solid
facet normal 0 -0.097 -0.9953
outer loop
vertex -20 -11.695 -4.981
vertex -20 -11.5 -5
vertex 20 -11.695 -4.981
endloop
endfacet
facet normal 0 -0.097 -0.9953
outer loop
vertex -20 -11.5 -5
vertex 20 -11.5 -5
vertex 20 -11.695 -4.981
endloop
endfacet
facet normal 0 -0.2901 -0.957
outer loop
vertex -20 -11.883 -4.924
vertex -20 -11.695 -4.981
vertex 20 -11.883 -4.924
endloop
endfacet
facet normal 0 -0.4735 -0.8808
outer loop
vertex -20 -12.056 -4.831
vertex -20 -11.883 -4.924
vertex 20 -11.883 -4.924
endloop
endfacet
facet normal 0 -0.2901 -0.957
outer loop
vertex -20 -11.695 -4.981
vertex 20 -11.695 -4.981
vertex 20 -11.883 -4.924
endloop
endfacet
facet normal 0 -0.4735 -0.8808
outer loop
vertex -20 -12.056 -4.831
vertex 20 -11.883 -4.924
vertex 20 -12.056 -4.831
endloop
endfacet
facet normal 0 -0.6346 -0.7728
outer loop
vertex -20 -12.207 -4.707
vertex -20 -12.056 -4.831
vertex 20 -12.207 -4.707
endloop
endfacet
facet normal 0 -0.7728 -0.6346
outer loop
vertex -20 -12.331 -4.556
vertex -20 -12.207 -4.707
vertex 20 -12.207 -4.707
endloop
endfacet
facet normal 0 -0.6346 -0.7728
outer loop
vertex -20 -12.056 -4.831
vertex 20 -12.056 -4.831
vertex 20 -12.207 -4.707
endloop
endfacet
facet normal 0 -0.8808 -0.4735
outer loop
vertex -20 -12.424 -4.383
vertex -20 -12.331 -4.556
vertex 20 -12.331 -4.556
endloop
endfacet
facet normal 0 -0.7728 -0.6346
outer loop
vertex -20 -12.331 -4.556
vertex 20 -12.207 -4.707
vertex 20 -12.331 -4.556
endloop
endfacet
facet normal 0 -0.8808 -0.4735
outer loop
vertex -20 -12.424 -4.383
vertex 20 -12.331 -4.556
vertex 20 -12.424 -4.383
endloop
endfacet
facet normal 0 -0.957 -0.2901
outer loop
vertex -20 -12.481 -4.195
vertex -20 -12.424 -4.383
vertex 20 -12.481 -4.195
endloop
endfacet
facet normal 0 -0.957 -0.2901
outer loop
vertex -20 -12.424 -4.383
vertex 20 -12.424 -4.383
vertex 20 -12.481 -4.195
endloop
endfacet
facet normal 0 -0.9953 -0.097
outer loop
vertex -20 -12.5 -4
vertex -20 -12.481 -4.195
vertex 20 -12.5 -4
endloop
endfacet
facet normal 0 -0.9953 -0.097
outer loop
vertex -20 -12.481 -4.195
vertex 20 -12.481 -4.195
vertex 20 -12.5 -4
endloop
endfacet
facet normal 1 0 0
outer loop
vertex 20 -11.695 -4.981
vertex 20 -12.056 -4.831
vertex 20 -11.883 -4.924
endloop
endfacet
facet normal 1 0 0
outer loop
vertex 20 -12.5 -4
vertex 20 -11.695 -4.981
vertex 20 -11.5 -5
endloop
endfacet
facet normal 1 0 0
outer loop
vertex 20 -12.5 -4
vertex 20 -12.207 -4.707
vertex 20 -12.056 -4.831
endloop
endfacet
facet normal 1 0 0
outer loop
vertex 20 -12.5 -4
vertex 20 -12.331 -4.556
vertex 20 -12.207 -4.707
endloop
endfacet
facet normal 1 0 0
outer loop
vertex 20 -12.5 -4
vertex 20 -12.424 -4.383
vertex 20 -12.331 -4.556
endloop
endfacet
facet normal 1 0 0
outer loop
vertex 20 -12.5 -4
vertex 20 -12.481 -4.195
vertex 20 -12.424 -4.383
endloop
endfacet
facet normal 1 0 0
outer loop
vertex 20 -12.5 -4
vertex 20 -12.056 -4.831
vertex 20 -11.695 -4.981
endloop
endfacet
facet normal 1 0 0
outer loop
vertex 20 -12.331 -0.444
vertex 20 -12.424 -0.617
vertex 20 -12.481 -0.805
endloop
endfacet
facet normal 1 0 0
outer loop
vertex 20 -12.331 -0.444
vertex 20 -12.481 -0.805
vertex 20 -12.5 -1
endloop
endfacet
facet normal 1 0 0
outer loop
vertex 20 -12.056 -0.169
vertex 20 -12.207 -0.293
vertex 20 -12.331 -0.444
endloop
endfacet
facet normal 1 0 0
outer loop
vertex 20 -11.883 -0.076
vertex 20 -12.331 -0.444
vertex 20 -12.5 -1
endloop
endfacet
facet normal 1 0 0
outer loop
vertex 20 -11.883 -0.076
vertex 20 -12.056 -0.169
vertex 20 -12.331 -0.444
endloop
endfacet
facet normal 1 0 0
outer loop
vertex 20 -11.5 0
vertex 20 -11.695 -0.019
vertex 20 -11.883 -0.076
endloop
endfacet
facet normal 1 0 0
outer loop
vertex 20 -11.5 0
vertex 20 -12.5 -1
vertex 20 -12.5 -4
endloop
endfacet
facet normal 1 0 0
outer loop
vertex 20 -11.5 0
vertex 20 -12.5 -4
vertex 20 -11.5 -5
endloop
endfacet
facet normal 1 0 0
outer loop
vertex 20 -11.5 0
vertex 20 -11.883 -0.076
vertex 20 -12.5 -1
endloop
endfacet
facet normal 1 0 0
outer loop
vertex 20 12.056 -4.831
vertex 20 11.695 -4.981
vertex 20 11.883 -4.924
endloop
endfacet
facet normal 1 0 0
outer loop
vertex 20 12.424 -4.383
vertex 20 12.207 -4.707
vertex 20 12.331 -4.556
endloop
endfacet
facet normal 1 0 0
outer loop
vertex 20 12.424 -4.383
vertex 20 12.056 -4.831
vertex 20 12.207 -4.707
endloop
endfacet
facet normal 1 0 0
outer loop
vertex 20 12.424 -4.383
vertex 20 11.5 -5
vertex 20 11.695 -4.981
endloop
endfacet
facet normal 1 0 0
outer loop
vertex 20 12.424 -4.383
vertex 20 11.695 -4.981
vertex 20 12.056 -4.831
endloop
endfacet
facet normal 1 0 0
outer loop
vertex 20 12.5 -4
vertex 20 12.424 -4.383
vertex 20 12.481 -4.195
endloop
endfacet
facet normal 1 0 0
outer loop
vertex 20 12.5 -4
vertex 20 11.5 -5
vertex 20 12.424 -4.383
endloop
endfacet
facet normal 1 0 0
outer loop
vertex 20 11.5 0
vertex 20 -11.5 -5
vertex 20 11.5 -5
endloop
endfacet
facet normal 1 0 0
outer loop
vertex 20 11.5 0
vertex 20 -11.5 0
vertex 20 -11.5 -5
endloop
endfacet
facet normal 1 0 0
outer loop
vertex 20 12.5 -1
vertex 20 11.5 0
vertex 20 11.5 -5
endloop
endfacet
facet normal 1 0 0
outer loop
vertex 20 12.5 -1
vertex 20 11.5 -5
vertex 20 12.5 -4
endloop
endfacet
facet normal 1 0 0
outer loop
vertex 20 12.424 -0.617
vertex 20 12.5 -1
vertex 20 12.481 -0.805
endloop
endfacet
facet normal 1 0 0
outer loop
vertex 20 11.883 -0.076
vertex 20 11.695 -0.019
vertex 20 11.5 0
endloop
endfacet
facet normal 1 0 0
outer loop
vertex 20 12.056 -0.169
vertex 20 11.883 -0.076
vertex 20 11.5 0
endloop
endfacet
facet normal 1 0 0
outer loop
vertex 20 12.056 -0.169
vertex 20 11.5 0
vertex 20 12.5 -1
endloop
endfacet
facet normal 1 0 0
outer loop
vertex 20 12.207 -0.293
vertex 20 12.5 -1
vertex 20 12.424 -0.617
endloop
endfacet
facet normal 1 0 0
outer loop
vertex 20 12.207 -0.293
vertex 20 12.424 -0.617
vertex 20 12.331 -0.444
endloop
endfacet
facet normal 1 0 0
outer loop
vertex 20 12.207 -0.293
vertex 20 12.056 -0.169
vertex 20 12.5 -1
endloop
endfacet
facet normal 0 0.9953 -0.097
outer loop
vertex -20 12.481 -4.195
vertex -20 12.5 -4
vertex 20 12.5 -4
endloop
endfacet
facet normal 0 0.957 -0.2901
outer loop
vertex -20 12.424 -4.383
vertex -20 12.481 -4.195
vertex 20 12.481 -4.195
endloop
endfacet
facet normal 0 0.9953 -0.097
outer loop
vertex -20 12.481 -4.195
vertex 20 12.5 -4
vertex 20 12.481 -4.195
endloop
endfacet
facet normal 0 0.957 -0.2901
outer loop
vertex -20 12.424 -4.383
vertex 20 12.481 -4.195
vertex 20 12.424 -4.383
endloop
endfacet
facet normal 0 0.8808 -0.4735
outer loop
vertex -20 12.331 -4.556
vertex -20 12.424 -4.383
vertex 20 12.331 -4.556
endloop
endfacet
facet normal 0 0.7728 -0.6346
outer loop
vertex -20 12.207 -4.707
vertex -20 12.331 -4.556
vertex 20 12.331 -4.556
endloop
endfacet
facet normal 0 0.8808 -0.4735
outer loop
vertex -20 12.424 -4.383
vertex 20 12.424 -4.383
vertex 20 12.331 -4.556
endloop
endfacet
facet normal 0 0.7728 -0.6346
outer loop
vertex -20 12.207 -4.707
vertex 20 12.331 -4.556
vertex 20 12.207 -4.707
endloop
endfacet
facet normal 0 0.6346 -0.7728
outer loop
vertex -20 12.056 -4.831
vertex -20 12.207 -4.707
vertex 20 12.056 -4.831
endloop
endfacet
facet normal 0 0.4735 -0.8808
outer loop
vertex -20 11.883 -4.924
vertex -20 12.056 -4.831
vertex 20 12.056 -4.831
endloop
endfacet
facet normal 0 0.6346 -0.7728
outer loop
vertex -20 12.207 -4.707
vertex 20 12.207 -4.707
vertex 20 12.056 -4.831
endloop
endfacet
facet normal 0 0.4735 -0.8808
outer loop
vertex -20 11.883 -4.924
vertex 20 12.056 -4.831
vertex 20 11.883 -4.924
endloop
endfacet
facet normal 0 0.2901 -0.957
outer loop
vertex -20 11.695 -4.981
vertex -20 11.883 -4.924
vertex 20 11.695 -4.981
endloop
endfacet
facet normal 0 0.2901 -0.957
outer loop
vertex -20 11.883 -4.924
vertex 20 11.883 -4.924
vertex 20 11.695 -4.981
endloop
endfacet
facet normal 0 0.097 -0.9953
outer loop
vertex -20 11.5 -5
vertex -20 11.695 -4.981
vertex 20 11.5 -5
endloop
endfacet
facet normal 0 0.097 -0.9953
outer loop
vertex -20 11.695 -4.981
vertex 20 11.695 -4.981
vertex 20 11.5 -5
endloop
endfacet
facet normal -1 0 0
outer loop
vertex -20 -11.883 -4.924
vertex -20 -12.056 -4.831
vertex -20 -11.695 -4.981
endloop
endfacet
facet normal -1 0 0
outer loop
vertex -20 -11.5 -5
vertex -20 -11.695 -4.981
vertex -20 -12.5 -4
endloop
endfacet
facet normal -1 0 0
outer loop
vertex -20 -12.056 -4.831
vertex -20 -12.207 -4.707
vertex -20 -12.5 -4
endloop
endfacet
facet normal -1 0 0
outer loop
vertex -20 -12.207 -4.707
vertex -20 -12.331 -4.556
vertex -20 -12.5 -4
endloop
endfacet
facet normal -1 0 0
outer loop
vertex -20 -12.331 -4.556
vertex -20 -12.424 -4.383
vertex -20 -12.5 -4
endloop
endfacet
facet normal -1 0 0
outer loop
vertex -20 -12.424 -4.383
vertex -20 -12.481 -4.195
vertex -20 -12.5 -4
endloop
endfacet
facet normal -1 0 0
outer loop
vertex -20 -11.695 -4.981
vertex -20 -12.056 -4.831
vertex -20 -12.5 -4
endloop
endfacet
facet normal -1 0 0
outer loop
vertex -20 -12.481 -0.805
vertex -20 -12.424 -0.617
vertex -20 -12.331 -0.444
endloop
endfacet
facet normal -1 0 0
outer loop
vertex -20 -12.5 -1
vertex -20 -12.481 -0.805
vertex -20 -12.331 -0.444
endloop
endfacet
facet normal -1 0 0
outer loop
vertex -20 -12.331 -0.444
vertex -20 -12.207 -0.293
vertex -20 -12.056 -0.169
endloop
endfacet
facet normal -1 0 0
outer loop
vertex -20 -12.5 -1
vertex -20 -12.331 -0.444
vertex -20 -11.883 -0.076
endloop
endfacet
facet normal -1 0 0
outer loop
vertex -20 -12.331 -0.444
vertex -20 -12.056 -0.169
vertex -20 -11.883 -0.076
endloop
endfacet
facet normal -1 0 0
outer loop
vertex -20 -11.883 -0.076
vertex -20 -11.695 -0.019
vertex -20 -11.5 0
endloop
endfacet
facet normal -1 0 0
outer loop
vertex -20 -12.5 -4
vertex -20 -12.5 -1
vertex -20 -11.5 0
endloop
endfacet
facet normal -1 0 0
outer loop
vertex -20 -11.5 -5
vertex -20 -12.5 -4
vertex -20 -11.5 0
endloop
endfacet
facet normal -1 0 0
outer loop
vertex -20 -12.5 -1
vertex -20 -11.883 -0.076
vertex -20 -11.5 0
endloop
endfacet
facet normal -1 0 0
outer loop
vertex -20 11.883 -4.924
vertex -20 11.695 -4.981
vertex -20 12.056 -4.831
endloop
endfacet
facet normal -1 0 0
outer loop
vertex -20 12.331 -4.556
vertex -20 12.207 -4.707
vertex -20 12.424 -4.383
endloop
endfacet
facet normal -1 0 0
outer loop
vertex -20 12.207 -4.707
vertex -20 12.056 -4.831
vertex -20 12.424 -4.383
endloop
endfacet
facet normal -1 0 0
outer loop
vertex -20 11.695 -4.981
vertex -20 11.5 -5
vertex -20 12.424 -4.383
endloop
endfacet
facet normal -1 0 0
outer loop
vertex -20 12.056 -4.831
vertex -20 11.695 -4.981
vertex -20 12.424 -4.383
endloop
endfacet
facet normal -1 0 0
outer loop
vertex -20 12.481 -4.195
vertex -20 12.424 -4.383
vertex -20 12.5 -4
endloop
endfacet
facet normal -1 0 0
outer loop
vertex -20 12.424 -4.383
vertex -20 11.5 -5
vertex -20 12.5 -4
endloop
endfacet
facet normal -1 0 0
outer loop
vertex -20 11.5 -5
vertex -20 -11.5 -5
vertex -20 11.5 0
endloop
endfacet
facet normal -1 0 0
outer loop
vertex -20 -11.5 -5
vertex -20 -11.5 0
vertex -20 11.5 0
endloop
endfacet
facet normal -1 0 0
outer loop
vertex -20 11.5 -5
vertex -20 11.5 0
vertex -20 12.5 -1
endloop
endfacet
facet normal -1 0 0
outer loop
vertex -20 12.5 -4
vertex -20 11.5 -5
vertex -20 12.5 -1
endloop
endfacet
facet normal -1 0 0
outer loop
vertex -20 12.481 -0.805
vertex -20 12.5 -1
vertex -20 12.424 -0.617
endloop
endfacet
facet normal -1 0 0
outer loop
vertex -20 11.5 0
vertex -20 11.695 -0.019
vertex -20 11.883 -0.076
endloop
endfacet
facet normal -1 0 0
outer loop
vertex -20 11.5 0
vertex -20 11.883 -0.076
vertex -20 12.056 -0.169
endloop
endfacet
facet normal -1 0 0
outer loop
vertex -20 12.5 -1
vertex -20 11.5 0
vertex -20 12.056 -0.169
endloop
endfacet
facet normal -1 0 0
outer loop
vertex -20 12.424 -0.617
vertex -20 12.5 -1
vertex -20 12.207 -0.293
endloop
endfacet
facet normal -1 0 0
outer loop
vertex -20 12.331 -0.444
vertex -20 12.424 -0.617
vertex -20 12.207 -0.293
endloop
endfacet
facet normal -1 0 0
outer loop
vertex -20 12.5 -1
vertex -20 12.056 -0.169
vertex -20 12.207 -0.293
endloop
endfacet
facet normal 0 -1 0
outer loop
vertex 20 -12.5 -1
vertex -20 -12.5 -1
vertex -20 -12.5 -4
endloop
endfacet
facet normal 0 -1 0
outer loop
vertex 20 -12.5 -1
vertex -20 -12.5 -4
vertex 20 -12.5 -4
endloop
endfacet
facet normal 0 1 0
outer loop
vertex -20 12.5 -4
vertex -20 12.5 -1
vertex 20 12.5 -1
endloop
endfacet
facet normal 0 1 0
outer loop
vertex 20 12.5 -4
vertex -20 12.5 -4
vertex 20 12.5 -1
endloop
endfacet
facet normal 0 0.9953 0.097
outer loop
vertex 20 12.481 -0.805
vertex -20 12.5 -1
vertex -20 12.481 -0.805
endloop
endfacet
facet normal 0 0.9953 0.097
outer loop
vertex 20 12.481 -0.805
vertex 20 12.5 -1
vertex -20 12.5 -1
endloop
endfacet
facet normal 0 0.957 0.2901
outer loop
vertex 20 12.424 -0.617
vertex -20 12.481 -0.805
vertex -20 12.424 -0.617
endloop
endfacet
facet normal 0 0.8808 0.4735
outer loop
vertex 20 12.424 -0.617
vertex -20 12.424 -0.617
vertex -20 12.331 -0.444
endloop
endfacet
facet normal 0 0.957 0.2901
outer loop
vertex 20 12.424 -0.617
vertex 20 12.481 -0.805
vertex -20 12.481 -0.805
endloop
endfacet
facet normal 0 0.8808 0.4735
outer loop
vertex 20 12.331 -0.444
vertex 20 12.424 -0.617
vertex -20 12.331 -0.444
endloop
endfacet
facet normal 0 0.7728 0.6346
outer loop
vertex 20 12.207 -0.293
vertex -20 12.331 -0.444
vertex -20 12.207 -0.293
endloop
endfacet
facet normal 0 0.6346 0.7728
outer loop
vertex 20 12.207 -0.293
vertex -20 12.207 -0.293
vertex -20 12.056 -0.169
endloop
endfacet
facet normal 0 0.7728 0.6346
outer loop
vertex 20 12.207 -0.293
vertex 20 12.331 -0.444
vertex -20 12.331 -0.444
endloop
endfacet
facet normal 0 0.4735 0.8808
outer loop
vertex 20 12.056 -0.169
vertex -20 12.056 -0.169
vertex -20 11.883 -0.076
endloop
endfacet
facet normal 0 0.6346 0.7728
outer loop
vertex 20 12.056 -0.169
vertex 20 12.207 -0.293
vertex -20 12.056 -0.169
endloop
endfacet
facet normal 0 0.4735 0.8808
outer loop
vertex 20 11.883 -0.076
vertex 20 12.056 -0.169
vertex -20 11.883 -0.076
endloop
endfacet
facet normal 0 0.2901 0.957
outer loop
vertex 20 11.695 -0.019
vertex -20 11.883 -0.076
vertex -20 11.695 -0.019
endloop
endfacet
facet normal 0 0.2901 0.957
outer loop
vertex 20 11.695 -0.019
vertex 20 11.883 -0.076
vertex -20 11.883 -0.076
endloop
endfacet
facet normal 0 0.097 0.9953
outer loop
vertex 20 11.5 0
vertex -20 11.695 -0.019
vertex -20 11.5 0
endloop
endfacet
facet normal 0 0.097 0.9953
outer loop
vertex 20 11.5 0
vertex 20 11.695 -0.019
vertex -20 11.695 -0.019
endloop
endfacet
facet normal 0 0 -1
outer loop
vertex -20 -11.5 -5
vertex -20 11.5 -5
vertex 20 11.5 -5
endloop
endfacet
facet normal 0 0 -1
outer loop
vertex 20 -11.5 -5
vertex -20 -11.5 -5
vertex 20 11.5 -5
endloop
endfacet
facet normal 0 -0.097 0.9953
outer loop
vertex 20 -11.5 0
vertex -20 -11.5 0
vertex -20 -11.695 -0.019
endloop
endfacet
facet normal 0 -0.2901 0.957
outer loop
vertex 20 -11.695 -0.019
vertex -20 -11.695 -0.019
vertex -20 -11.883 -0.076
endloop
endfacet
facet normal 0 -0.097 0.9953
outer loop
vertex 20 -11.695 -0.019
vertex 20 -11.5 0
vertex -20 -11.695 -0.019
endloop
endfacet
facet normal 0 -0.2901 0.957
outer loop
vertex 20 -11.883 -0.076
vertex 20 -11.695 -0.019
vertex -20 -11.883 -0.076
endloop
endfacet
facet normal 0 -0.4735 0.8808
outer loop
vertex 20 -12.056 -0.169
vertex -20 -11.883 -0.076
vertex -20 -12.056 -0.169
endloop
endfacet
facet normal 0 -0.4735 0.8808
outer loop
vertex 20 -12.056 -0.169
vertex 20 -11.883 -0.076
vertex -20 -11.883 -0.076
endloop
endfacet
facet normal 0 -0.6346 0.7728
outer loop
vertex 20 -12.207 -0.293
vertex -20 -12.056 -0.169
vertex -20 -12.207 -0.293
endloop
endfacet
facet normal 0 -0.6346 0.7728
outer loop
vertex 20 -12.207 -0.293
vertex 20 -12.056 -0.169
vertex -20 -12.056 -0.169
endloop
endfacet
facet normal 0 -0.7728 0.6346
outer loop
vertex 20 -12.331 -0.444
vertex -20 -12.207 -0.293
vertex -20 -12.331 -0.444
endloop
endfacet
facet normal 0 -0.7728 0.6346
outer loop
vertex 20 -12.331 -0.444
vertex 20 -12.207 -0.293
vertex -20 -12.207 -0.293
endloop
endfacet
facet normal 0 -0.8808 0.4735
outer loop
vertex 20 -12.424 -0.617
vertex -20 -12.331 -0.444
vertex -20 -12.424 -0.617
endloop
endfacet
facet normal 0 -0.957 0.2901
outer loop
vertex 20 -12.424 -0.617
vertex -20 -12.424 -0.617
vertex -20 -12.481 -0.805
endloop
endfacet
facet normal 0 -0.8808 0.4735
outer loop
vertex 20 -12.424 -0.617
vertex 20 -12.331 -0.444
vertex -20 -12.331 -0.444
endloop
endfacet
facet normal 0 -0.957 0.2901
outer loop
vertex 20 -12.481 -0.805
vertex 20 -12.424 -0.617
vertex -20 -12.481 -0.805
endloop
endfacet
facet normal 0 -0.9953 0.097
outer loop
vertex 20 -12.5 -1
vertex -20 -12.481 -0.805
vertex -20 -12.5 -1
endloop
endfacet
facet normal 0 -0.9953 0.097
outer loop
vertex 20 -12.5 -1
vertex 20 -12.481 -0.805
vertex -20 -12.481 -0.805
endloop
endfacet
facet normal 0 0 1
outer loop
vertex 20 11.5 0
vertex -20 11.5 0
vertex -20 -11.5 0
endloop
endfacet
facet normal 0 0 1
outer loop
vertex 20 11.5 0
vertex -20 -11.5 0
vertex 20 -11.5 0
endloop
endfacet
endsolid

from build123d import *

# Parameters (mm, degrees)
SKETCH_1_W      = 40
SKETCH_1_H      = 25
EXTRUDE_1_DEPTH = 5
FILLET_2_R      = 1
FILLET_3_R      = 1


with BuildPart() as part:
    # 草图1 → 凸台-拉伸1 (new body)
    with BuildSketch(Plane.XY):
        Rectangle(SKETCH_1_W, SKETCH_1_H)
    extrude(amount=-EXTRUDE_1_DEPTH)

    # 圆角2
    fillet_2_edges = [part.edges().sort_by_distance(p)[0] for p in [
        (0, 12.5, 0),
    ]]
    fillet(fillet_2_edges, radius=FILLET_2_R)

    # 圆角3
    fillet_3_edges = [part.edges().sort_by_distance(p)[0] for p in [
        (0, 12.5, -5),
        (0, -12.5, 0),
        (0, -12.5, -5),
    ]]
    fillet(fillet_3_edges, radius=FILLET_3_R)


solid = part.part
